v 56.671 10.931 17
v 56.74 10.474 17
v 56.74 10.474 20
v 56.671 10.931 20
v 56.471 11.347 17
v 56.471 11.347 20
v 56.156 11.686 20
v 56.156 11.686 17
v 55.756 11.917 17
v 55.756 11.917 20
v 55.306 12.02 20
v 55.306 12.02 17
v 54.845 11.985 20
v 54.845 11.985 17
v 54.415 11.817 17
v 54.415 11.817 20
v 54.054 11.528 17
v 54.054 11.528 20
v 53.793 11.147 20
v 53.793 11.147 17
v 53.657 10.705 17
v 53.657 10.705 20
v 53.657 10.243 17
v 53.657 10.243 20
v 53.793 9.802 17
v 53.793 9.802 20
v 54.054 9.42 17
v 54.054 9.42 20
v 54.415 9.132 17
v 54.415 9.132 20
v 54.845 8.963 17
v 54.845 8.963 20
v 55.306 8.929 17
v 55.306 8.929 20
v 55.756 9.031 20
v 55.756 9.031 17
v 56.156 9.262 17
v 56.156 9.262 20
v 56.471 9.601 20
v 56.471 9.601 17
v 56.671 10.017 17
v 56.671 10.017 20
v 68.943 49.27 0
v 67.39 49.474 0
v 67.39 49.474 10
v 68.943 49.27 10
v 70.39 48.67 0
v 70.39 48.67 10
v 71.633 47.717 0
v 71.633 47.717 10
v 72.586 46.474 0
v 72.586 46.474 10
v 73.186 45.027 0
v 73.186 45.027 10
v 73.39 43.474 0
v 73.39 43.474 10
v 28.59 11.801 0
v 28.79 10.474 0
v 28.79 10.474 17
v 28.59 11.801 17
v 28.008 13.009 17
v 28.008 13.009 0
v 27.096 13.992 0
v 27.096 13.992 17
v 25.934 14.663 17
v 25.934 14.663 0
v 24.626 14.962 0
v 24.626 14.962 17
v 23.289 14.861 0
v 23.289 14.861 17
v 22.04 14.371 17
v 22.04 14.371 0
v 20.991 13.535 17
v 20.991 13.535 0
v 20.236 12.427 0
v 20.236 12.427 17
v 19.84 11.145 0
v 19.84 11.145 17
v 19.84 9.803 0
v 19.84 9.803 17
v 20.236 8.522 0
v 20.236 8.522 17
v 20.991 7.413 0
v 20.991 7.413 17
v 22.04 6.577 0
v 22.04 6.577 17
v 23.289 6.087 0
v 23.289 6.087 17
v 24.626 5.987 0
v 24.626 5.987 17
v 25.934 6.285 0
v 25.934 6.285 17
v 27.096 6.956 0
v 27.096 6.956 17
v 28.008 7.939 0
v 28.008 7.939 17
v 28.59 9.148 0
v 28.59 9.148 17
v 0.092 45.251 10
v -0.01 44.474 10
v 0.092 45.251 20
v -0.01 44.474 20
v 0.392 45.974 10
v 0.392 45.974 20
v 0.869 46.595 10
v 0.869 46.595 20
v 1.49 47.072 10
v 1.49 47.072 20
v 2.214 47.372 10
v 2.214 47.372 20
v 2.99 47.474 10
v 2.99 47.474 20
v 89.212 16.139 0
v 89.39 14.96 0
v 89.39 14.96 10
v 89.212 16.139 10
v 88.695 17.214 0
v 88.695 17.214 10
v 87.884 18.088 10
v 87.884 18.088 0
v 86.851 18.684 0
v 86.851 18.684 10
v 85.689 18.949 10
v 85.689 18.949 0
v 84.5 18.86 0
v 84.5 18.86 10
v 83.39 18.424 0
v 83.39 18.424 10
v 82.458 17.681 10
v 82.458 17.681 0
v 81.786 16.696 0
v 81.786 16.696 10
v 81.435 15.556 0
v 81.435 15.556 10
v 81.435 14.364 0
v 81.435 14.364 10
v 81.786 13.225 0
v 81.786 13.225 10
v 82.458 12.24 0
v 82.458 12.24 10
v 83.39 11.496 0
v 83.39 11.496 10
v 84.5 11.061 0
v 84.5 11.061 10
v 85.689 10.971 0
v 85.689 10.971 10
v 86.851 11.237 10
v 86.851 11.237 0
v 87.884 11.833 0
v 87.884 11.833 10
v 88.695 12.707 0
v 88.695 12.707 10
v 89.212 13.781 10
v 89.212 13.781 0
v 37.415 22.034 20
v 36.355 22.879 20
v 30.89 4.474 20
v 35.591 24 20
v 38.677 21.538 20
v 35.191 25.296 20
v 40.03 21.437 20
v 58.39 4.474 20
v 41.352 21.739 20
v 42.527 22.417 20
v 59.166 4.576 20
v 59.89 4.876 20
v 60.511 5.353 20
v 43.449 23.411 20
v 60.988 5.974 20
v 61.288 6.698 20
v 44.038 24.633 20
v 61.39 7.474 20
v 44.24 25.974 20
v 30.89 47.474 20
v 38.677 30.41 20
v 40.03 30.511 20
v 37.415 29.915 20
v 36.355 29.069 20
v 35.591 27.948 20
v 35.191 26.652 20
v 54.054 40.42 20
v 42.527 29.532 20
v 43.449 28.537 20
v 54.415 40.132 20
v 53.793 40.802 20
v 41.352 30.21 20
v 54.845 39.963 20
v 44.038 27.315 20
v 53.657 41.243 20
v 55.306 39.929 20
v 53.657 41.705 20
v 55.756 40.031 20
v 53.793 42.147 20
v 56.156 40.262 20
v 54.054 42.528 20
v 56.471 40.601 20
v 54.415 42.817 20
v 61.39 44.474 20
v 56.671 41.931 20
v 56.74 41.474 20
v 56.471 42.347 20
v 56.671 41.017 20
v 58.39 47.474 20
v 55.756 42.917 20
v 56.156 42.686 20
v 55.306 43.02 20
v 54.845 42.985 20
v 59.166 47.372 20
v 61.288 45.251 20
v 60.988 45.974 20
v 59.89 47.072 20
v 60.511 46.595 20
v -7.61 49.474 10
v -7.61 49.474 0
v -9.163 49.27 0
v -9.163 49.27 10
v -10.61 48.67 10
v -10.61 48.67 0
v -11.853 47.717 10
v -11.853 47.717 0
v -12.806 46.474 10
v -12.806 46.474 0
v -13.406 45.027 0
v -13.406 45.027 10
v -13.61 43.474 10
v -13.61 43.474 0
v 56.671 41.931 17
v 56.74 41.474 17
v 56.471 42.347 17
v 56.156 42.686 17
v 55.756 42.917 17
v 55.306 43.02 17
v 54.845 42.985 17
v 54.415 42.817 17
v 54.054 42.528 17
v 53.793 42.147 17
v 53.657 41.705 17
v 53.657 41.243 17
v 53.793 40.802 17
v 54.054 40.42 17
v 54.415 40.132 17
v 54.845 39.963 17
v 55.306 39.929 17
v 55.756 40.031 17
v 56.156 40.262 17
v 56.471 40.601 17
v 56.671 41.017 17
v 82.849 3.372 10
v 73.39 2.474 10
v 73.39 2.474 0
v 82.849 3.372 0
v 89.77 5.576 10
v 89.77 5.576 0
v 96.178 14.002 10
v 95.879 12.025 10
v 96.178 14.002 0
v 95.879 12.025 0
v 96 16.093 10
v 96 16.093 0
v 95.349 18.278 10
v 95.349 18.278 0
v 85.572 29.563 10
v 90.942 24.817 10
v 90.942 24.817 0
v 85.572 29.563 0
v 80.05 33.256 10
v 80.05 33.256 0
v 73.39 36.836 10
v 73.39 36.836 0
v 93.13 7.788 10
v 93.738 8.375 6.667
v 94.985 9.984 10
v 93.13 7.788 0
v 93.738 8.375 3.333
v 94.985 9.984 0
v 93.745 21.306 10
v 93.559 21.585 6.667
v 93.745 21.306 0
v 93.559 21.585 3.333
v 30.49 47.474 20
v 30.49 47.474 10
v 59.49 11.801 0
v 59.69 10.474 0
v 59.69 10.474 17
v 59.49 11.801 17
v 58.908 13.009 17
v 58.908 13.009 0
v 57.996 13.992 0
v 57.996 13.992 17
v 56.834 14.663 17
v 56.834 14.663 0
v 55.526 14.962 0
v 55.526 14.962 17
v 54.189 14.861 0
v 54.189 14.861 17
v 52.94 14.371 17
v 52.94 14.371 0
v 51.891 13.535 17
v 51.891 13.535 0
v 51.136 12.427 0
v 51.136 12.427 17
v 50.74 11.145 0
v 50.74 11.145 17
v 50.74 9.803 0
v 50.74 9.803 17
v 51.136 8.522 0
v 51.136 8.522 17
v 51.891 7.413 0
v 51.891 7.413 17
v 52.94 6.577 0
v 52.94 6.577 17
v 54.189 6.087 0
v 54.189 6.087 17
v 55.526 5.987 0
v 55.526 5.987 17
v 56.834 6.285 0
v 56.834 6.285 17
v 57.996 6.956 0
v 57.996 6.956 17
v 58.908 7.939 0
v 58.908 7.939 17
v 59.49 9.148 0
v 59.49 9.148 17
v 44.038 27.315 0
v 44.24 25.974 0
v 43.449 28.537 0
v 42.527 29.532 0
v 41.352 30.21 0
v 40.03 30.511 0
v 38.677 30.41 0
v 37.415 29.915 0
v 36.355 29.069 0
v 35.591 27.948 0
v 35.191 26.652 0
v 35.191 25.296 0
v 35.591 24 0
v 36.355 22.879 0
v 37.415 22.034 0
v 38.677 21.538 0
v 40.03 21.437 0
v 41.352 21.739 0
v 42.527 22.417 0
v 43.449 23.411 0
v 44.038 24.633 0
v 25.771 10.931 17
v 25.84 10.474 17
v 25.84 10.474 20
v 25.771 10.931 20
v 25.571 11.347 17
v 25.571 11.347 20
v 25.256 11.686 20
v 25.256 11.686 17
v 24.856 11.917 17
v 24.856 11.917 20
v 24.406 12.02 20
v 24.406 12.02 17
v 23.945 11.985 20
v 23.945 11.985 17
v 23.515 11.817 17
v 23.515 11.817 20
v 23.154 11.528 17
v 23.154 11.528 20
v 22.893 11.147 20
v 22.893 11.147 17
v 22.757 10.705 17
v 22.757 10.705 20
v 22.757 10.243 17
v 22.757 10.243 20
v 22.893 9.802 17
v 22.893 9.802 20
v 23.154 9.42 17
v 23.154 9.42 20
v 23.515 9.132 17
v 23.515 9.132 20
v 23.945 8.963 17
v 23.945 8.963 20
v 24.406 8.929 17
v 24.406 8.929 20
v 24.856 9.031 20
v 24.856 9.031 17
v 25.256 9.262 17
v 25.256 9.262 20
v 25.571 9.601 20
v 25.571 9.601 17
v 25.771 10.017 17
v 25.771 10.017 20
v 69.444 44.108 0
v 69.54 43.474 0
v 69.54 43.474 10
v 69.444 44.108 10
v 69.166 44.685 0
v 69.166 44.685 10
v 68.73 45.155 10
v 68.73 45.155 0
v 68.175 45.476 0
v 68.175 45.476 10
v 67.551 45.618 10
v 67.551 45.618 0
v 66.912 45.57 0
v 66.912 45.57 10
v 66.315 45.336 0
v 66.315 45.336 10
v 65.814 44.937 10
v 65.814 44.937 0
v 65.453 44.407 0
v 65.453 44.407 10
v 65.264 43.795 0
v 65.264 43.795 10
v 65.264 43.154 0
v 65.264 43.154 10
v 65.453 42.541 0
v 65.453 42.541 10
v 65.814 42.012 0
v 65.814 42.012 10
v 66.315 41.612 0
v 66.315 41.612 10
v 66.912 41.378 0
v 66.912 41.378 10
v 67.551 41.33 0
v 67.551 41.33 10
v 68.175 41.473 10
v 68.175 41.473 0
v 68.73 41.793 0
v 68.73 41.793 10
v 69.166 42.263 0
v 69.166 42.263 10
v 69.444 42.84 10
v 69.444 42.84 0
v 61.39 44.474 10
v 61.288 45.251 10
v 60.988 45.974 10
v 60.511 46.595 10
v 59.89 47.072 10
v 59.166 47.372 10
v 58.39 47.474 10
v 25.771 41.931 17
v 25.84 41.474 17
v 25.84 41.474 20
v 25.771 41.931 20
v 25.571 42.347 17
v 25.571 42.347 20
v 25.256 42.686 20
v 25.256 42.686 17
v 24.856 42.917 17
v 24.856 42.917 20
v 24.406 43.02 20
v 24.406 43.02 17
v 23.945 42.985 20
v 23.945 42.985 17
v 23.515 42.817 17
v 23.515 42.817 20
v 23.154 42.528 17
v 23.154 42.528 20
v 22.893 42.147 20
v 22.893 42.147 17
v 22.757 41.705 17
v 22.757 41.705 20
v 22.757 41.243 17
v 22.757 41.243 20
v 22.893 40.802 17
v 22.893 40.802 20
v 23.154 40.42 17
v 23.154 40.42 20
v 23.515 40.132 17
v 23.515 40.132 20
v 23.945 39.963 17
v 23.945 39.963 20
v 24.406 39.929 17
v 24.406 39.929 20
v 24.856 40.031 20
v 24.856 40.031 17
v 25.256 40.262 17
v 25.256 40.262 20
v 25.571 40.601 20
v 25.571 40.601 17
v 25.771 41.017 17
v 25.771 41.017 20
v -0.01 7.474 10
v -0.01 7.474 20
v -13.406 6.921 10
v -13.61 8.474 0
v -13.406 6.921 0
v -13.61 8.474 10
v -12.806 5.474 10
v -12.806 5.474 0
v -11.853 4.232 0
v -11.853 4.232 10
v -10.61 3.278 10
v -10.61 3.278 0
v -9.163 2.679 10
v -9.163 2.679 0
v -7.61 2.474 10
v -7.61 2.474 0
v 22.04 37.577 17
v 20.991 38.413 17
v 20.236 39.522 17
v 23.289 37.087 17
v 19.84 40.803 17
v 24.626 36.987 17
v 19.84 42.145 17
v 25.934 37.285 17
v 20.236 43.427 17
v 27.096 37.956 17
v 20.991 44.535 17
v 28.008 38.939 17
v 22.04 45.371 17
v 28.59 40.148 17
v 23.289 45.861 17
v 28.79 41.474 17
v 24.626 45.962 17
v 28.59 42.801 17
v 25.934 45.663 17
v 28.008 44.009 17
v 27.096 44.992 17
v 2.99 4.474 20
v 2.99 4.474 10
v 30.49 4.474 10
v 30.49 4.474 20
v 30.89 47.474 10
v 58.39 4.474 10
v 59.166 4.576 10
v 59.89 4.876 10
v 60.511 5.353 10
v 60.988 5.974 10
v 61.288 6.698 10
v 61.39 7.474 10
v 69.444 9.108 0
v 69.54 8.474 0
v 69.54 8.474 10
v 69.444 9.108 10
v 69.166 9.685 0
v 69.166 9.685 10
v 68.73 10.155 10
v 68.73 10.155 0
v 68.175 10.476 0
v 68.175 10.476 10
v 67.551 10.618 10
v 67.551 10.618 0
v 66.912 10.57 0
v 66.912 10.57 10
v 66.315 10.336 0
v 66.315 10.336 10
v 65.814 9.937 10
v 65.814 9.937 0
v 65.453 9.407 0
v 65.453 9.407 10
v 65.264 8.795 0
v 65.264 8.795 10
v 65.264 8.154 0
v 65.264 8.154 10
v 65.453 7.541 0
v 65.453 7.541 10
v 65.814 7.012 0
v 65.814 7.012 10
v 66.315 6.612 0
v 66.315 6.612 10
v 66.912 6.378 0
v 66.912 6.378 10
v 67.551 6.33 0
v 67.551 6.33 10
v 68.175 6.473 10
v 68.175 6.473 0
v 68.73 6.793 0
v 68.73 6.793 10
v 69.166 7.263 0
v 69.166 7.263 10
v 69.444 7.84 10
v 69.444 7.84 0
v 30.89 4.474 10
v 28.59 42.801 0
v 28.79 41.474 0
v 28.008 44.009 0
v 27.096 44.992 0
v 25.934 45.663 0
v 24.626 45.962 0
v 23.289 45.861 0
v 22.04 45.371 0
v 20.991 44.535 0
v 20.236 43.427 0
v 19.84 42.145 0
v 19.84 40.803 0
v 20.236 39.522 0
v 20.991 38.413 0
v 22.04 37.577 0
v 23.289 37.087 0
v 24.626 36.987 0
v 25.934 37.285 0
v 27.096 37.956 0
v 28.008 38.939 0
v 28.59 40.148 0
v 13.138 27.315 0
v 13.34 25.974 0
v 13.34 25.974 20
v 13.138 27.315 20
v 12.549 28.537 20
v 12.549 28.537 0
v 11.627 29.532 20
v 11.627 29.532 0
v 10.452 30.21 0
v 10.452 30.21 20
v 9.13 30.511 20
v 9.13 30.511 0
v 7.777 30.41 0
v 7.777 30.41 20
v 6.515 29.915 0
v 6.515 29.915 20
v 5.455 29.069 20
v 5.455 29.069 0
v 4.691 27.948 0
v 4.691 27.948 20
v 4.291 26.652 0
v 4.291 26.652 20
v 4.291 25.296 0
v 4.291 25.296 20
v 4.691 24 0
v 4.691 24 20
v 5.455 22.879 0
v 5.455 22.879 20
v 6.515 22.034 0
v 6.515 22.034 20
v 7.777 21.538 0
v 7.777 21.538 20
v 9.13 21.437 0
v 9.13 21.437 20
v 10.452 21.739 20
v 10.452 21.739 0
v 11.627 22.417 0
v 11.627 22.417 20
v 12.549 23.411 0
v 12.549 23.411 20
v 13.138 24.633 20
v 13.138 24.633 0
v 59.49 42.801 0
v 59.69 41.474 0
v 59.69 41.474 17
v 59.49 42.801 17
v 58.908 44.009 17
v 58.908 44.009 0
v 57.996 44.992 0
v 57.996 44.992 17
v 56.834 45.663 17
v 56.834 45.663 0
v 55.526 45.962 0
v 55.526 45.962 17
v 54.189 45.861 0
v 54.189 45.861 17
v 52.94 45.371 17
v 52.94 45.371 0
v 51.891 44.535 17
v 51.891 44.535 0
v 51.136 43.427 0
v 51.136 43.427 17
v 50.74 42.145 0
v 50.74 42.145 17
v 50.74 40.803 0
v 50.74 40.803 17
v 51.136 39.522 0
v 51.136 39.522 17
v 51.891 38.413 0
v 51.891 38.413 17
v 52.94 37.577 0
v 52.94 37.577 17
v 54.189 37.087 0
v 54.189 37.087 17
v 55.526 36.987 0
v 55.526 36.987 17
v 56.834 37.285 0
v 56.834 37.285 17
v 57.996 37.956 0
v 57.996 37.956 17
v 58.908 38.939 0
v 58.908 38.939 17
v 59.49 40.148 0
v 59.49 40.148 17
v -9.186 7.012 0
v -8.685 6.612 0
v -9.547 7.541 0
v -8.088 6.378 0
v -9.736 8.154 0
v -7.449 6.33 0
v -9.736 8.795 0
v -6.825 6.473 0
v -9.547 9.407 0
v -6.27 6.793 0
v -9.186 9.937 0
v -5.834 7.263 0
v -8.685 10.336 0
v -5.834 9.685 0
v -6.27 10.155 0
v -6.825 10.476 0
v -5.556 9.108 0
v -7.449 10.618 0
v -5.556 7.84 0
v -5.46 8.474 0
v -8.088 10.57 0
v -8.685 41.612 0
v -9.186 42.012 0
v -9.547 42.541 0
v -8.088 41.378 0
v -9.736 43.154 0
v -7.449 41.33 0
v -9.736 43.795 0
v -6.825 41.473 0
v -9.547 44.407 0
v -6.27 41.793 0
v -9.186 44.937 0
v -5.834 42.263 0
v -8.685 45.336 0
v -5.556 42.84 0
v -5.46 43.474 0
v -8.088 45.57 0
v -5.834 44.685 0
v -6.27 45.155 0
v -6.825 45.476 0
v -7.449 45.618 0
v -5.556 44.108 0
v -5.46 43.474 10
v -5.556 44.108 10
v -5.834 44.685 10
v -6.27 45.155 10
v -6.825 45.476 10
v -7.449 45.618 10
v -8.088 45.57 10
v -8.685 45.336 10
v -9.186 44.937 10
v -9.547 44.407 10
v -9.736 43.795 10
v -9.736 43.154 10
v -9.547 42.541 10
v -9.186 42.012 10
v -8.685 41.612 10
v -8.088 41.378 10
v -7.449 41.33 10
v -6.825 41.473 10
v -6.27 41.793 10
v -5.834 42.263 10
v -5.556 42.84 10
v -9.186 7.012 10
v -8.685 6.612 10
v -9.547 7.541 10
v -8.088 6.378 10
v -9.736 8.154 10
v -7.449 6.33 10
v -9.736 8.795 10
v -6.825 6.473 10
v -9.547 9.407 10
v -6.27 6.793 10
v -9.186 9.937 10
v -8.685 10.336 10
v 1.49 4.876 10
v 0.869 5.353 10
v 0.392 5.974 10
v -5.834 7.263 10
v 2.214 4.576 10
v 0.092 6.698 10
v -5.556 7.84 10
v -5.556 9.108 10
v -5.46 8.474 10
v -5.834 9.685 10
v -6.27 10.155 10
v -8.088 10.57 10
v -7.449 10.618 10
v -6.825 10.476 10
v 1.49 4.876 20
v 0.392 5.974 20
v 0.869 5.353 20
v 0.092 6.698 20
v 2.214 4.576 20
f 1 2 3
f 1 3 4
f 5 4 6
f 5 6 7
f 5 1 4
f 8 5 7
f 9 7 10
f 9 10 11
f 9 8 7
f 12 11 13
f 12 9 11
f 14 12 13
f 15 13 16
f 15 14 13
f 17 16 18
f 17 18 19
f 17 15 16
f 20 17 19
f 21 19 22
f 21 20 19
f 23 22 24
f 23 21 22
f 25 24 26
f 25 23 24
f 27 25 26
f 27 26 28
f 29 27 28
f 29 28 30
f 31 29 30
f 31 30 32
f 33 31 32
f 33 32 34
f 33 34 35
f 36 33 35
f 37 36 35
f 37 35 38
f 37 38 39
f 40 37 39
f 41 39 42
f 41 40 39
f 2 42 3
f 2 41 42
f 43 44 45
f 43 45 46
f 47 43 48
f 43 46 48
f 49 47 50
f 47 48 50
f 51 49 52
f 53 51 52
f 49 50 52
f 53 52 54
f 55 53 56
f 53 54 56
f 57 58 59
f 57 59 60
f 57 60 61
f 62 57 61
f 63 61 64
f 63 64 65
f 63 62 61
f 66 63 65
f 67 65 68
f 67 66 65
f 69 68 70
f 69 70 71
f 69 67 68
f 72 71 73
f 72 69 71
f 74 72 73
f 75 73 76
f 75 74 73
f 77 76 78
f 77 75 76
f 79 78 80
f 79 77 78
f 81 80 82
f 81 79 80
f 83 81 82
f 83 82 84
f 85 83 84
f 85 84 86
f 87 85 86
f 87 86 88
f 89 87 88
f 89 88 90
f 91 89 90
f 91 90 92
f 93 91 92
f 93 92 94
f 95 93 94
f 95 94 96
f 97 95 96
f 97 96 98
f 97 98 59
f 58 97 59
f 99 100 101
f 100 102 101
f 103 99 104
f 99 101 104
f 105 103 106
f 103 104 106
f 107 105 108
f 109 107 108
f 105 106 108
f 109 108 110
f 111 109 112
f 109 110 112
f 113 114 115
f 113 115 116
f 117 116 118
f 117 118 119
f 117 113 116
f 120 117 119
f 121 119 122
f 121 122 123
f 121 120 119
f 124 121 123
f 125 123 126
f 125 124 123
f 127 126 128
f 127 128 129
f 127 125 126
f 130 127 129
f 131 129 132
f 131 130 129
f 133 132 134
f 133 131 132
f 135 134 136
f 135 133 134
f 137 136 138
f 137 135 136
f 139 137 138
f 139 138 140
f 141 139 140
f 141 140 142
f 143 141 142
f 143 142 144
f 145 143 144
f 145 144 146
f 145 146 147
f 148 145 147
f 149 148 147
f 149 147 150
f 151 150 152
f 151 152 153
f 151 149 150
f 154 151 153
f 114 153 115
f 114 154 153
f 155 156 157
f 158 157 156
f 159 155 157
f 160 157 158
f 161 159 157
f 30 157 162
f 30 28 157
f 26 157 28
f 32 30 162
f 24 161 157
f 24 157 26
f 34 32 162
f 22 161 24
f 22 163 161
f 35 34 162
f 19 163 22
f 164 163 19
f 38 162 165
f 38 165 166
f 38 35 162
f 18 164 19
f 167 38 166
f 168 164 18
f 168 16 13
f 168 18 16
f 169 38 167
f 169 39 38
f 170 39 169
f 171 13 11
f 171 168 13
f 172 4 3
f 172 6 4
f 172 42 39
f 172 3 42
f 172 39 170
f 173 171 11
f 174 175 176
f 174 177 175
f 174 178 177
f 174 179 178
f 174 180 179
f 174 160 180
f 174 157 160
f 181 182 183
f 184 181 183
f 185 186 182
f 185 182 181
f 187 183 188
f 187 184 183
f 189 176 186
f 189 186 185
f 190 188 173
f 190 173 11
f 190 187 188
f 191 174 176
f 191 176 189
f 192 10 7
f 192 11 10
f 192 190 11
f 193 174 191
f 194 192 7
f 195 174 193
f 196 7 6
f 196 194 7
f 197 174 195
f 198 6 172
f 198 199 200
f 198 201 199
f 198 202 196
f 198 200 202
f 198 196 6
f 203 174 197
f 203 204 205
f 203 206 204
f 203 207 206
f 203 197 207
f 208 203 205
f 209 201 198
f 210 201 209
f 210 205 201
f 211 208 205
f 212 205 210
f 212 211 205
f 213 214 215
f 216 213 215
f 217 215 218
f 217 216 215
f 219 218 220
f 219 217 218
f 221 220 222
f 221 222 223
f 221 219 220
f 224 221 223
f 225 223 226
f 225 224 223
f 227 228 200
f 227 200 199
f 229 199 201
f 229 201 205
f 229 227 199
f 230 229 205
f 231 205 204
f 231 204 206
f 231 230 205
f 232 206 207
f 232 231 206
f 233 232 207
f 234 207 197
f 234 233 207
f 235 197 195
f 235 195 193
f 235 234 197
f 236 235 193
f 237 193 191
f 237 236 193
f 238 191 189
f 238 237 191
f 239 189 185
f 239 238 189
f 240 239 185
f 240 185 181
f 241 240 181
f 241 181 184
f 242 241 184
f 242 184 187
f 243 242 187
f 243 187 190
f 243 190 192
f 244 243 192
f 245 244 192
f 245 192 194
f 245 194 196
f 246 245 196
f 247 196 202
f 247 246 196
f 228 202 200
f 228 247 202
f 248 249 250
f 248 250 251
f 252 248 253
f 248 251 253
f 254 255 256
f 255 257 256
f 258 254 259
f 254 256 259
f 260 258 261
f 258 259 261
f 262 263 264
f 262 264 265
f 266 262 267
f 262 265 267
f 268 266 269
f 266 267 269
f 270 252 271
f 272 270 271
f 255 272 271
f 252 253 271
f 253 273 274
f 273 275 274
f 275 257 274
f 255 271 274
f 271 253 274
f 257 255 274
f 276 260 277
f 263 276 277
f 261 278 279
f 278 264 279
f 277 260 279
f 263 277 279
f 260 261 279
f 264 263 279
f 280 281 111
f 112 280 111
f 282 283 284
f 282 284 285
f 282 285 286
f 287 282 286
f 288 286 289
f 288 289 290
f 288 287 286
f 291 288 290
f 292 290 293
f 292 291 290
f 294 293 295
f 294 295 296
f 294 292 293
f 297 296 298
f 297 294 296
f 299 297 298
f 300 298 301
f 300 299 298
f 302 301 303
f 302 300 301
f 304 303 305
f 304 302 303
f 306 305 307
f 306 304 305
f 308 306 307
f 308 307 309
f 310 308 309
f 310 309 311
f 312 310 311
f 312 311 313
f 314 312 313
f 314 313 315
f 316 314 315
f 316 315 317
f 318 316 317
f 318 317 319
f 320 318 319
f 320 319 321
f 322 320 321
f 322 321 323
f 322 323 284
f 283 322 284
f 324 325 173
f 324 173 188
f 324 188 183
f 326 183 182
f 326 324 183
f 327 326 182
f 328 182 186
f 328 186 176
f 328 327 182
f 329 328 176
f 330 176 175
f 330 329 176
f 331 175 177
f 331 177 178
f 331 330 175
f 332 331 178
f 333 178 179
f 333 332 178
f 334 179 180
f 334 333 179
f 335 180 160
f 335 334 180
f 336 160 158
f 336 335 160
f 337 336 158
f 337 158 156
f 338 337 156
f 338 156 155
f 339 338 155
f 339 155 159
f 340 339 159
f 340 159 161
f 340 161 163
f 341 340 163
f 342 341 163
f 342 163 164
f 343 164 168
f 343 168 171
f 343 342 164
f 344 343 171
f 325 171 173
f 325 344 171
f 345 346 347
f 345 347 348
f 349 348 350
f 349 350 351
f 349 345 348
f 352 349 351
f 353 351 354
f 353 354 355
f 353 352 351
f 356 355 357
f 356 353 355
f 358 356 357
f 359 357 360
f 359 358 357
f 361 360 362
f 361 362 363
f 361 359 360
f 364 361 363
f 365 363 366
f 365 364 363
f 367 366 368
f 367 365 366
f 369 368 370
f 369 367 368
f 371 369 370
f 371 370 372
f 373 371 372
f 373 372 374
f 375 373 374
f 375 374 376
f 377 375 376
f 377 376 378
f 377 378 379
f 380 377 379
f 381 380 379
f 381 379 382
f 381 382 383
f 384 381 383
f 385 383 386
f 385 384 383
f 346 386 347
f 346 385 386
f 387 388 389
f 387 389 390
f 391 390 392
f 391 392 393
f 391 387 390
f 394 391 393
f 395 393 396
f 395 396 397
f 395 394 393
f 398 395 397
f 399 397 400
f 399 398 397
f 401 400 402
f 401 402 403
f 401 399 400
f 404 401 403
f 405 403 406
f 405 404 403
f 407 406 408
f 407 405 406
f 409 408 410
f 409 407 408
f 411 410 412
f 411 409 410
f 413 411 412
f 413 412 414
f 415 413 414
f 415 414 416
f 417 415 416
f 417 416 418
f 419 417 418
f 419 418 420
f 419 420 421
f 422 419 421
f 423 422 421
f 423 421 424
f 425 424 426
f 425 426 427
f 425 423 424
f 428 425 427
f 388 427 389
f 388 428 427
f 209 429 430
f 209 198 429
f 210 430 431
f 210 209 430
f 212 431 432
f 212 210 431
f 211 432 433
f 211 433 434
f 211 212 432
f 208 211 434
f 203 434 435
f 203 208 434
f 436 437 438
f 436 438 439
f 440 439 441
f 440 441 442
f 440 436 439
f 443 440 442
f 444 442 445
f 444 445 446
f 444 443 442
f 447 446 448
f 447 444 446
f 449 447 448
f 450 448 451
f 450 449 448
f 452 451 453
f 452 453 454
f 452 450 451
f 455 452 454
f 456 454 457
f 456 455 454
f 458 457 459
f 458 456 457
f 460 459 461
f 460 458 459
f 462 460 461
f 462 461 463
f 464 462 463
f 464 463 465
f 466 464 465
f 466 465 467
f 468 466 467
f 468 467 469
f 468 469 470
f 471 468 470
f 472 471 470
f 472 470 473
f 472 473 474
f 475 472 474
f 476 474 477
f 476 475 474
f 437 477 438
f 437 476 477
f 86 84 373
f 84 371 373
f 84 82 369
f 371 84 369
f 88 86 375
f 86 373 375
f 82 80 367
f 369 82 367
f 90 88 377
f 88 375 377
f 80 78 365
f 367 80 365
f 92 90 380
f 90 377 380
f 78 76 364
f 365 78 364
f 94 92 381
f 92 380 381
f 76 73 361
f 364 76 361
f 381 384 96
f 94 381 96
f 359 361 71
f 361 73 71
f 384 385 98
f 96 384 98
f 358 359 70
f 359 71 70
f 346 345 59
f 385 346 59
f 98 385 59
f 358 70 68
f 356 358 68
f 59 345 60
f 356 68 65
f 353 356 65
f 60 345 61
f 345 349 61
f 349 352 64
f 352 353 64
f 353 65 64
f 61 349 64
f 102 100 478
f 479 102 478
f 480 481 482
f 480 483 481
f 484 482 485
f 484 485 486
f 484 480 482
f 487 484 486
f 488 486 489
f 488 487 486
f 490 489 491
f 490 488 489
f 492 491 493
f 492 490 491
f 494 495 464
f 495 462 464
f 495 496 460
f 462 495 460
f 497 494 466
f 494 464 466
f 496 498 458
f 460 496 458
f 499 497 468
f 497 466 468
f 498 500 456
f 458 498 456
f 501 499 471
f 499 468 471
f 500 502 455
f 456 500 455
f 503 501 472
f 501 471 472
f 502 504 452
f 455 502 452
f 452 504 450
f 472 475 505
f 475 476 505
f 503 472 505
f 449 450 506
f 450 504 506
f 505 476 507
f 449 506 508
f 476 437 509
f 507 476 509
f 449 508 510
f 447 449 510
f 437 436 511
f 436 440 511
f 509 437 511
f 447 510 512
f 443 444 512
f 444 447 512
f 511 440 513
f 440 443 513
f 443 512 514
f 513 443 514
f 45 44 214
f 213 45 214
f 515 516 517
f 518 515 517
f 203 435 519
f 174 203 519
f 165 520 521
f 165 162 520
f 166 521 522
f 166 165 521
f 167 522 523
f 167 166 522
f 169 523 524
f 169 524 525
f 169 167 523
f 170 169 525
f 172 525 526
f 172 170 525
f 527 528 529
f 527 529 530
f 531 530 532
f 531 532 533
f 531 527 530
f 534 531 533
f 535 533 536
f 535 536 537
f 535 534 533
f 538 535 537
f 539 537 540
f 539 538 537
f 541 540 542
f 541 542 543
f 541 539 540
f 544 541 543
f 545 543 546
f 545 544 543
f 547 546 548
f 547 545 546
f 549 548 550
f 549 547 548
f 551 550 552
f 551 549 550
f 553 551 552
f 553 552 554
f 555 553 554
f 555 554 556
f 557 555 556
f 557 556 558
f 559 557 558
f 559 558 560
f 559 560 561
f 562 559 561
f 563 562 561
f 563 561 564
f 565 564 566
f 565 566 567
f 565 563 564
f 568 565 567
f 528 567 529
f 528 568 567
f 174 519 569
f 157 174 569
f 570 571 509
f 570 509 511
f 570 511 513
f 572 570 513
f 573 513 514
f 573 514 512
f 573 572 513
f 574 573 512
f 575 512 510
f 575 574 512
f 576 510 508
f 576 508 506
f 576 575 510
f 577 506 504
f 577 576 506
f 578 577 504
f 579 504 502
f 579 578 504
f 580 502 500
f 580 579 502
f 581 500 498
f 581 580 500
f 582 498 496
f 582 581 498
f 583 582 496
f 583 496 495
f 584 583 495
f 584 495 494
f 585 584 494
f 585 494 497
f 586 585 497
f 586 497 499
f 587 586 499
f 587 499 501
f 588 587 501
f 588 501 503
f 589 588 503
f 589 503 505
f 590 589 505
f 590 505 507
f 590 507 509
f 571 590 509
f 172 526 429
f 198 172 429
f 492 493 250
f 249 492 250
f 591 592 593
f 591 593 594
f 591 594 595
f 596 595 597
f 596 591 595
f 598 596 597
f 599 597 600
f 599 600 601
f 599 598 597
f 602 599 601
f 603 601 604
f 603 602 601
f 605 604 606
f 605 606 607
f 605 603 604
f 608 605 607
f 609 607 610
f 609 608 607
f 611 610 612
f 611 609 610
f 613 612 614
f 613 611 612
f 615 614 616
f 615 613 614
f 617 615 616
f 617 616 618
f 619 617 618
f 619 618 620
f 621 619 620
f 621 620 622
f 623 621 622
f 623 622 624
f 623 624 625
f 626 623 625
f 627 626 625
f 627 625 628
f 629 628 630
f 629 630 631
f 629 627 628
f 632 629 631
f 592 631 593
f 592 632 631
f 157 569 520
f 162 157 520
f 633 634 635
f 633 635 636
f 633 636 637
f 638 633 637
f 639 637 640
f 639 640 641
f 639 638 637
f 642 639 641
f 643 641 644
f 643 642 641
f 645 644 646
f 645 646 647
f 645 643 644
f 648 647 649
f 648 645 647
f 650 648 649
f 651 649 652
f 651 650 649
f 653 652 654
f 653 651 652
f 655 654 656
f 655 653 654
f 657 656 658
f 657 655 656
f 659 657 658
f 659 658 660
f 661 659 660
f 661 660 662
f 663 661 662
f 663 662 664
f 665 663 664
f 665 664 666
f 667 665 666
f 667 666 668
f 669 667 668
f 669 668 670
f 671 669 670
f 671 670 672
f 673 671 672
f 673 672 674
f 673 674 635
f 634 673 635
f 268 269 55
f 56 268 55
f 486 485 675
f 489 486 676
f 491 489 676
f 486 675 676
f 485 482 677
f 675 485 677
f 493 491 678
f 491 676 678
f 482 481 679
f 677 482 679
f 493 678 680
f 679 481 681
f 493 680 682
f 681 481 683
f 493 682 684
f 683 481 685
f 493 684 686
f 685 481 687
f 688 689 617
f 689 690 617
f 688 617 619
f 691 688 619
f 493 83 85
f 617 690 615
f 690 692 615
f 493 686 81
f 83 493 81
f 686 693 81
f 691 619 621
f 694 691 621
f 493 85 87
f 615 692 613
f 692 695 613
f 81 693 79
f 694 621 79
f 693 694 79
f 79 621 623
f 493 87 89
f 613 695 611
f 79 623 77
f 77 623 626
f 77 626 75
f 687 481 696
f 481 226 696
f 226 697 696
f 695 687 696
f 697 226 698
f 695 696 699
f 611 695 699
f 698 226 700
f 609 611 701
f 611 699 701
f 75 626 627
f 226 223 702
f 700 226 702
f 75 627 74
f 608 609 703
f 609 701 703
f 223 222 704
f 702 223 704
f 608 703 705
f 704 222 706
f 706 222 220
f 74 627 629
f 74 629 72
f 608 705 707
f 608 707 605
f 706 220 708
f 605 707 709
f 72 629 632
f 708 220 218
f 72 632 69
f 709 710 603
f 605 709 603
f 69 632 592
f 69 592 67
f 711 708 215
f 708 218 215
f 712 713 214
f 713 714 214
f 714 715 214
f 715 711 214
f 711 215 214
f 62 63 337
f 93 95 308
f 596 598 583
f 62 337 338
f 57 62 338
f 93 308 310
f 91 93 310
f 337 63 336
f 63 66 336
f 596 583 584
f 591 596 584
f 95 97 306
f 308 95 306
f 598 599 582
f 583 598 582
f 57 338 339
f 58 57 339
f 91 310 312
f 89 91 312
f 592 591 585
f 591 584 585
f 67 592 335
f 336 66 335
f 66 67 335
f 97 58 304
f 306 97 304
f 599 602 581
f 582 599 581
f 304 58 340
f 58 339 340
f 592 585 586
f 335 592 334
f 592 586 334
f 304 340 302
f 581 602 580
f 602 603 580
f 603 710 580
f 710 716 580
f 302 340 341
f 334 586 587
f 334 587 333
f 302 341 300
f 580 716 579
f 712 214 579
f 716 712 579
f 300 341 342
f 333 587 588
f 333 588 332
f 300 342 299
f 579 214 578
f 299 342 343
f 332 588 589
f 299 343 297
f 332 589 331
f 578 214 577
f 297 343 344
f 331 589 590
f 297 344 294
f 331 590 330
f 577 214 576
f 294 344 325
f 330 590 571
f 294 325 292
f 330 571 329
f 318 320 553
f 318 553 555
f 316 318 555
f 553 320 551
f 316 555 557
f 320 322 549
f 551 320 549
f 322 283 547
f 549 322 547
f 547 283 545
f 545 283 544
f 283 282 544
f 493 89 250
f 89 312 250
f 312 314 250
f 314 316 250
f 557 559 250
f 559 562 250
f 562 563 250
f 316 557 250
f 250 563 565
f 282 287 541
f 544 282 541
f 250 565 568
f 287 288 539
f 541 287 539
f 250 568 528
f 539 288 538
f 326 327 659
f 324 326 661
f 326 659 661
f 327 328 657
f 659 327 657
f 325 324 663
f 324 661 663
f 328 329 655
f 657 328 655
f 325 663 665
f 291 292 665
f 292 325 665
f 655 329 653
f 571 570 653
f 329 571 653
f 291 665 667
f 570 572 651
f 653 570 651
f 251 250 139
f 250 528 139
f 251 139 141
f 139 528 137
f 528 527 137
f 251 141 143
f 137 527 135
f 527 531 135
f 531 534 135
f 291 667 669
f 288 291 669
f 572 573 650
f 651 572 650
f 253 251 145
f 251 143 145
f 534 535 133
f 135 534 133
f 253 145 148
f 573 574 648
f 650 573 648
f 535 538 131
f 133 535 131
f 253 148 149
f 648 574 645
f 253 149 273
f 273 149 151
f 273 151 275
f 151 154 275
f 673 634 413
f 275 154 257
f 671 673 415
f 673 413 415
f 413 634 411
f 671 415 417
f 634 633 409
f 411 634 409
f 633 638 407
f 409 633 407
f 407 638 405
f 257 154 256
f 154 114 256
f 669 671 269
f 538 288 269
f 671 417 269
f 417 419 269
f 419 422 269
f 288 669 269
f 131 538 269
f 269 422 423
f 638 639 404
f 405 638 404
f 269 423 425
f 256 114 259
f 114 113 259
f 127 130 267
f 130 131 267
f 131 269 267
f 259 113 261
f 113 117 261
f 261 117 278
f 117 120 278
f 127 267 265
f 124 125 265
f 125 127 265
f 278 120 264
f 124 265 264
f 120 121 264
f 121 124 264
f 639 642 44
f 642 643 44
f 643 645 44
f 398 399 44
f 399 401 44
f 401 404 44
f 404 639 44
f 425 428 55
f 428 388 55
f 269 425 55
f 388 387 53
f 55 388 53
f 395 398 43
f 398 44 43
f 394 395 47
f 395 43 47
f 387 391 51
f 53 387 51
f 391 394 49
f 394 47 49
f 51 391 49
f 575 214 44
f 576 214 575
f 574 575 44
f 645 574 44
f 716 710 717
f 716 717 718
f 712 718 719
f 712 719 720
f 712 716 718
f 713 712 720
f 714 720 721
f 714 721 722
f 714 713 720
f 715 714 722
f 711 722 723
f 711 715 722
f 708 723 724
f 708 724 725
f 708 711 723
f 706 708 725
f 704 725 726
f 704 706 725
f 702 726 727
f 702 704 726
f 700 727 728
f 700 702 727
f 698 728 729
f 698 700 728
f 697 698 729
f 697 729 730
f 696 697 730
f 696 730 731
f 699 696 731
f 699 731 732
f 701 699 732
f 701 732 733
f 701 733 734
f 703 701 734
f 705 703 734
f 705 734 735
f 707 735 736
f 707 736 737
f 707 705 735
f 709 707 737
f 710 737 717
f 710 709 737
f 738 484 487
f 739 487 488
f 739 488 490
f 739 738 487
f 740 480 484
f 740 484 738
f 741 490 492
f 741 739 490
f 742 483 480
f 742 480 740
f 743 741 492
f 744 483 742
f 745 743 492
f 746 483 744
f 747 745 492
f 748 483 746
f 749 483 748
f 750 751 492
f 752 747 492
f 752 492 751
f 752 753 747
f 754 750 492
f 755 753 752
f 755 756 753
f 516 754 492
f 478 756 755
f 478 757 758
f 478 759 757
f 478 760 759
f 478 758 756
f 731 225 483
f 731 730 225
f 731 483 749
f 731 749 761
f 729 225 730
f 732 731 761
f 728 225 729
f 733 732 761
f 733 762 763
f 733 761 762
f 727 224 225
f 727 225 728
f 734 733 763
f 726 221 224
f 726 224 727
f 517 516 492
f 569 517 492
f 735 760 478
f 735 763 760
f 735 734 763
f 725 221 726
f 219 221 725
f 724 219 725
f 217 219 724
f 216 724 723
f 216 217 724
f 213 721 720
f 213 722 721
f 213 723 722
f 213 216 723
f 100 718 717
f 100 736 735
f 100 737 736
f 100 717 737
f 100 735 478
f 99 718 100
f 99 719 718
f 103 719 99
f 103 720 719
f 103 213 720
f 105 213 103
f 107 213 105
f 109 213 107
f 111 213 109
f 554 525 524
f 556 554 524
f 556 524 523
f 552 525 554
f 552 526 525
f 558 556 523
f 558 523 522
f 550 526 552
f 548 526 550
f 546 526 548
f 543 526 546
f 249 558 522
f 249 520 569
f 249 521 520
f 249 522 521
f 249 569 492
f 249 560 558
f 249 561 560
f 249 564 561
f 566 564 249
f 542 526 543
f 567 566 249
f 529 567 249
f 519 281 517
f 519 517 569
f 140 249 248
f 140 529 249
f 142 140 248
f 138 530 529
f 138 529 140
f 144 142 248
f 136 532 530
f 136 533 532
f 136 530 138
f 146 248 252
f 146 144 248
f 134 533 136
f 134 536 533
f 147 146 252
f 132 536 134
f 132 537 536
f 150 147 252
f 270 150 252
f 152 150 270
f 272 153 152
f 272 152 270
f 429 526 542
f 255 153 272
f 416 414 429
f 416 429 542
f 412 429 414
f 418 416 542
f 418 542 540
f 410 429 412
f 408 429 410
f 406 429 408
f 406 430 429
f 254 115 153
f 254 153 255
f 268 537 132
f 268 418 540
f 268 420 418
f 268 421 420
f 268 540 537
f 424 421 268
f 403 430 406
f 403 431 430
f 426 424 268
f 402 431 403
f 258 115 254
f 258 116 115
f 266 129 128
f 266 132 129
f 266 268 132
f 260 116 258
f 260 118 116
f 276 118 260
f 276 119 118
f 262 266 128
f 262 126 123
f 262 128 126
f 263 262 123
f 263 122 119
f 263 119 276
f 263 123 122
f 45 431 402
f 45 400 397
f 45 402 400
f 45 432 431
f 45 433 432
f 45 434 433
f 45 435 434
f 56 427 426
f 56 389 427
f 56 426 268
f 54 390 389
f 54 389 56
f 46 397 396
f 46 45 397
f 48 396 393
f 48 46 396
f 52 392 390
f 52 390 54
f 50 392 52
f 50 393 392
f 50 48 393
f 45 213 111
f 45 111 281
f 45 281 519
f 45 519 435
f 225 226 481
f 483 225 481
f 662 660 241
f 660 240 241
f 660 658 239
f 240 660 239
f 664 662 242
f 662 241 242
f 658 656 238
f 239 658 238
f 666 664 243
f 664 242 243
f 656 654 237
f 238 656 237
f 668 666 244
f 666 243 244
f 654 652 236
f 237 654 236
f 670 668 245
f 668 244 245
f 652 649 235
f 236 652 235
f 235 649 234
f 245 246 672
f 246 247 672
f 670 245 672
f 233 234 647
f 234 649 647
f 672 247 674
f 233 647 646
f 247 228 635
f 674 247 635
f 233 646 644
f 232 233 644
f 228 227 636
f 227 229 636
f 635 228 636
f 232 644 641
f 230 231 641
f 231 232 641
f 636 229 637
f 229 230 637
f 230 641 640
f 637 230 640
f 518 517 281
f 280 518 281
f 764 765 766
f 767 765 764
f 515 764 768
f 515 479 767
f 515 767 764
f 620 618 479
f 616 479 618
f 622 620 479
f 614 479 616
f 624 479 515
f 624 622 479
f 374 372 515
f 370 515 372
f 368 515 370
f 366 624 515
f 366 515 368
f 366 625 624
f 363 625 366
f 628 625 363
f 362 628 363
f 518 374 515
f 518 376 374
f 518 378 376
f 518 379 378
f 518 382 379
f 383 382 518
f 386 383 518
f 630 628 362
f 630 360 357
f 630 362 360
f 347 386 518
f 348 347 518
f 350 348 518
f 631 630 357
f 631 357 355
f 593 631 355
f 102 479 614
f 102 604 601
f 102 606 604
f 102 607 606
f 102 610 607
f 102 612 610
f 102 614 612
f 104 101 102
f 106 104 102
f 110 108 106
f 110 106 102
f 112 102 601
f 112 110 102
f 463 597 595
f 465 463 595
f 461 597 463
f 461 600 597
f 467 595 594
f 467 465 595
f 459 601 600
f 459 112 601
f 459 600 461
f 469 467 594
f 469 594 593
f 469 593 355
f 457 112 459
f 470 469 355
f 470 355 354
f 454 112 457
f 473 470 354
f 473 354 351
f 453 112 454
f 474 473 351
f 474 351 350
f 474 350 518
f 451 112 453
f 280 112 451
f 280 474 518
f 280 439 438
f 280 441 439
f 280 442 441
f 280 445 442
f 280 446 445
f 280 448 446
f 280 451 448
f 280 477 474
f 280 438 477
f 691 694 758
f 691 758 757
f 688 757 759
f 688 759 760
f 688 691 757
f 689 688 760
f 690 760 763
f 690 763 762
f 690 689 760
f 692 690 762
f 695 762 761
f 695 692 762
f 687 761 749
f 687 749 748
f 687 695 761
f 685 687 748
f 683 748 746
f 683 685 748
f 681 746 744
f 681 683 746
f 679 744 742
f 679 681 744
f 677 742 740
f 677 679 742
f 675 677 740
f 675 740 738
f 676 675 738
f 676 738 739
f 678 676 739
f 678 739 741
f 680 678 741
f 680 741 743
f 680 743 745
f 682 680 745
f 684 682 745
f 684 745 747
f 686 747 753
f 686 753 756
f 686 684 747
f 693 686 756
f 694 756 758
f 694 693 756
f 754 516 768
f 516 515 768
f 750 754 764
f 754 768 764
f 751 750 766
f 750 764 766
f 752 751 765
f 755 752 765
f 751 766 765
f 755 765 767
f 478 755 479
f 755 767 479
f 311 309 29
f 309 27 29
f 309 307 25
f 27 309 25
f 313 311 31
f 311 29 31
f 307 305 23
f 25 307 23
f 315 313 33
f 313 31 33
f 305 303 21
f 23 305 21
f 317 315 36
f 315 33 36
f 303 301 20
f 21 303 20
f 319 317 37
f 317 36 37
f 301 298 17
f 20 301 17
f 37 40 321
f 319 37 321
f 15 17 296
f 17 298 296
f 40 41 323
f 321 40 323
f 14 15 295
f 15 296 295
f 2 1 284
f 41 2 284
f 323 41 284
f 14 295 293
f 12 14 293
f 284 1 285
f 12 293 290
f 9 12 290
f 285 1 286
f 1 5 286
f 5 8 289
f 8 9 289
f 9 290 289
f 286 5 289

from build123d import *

# Parameters (mm, degrees)
F0_R     = 2.15
F0_R_2   = 4
F1_DEPTH = 10
F0_R_3   = 4.5
F0_R_4   = 4.55
F2_DEPTH = 20
F3_START = 17
F0_R_5   = 1.55
F3_DEPTH = 3
F4_R     = 6
F5_R     = 3


with BuildPart() as f1:
    # F0 (on Top) → F1 (new body)
    with BuildSketch(Plane.XY):
        Polygon((73.3899642625, 49.4741697694), (-13.6100357375, 49.4741697694), (-13.6100357375, 2.4741697694), (73.3899642625, 2.4741697694), (73.3899642625, 36.8359796703), align=None)
        with Locations((-7.6100357375, 8.4741697694)):
            Circle(F0_R, mode=Mode.SUBTRACT)
        Polygon((-0.0100357375, 4.4741697694), (-0.0100357375, 47.4741697694), (30.4899642625, 47.4741697694), (30.4899642625, 4.4741697694), (20.6151821792, 4.4741697694), (8.9151821792, 4.4741697694), align=None, mode=Mode.SUBTRACT)
        with Locations((67.3899642625, 8.4741697694)):
            Circle(F0_R, mode=Mode.SUBTRACT)
        with Locations((-7.6100357375, 43.4741697694)):
            Circle(F0_R, mode=Mode.SUBTRACT)
        Polygon((30.8899642625, 4.4741697694), (30.8899642625, 47.4741697694), (61.3899642625, 47.4741697694), (61.3899642625, 4.4741697694), (53.5151823588, 4.4741697694), (41.8151823588, 4.4741697694), align=None, mode=Mode.SUBTRACT)
        with Locations((67.3899642625, 43.4741697694)):
            Circle(F0_R, mode=Mode.SUBTRACT)
        with BuildLine():
            add(Edge.make_bspline(
                [(73.3899642625, 2.4741697694), (104.1805148125, 2.9646980111), (103.3740565181, 22.3197154701), (73.3899642625, 36.8359796703)],
                knots=[0, 0, 0, 0, 34.3618099009, 34.3618099009, 34.3618099009, 34.3618099009], degree=3))
            Line((73.3899642625, 36.8359796703), (73.3899642625, 2.4741697694))
        make_face()
        with Locations((85.3899642625, 14.960267581)):
            Circle(F0_R_2, mode=Mode.SUBTRACT)
    extrude(amount=F1_DEPTH)

    # F0 (on Top) → F2 (join)
    with BuildSketch(Plane.XY):
        Polygon((30.4899642625, 47.4741697694), (-0.0100357375, 47.4741697694), (-0.0100357375, 4.4741697694), (8.9151821792, 4.4741697694), (20.6151821792, 4.4741697694), (30.4899642625, 4.4741697694), align=None)
        with Locations((24.2899642625, 10.4741697694)):
            Circle(F0_R_3, mode=Mode.SUBTRACT)
        with Locations((8.7899642625, 25.9741697694)):
            Circle(F0_R_4, mode=Mode.SUBTRACT)
        with Locations((24.2899642625, 41.4741697694)):
            Circle(F0_R_3, mode=Mode.SUBTRACT)
        Polygon((61.3899642625, 47.4741697694), (30.8899642625, 47.4741697694), (30.8899642625, 4.4741697694), (41.8151823588, 4.4741697694), (53.5151823588, 4.4741697694), (61.3899642625, 4.4741697694), align=None)
        with Locations((39.6899642625, 25.9741697694)):
            Circle(F0_R_4, mode=Mode.SUBTRACT)
        with Locations((55.1899642625, 10.4741697694)):
            Circle(F0_R_3, mode=Mode.SUBTRACT)
        with Locations((55.1899642625, 41.4741697694)):
            Circle(F0_R_3, mode=Mode.SUBTRACT)
    extrude(amount=F2_DEPTH)

    # F0 (on Top) → F3 (join)
    with BuildSketch(Plane.XY.offset(F3_START)):
        with Locations((24.2899642625, 41.4741697694)):
            Circle(F0_R_3)
        with Locations((24.2899642625, 41.4741697694)):
            Circle(F0_R_5, mode=Mode.SUBTRACT)
        with Locations((55.1899642625, 41.4741697694)):
            Circle(F0_R_3)
        with Locations((55.1899642625, 41.4741697694)):
            Circle(F0_R_5, mode=Mode.SUBTRACT)
        with Locations((55.1899642625, 10.4741697694)):
            Circle(F0_R_3)
        with Locations((55.1899642625, 10.4741697694)):
            Circle(F0_R_5, mode=Mode.SUBTRACT)
        with Locations((24.2899642625, 10.4741697694)):
            Circle(F0_R_3)
        with Locations((24.2899642625, 10.4741697694)):
            Circle(F0_R_5, mode=Mode.SUBTRACT)
    extrude(amount=F3_DEPTH)

    # F4
    f4_edges = [f1.edges().sort_by_distance(p)[0] for p in [
        (73.389964, 2.47417, 5),
        (73.389964, 49.47417, 5),
        (-13.610036, 49.47417, 5),
        (-13.610036, 2.47417, 5),
    ]]
    fillet(f4_edges, radius=F4_R)

    # F5
    f5_edges = [f1.edges().sort_by_distance(p)[0] for p in [
        (-0.010036, 4.47417, 15),
        (61.389964, 4.47417, 15),
        (61.389964, 47.47417, 15),
        (-0.010036, 47.47417, 15),
    ]]
    fillet(f5_edges, radius=F5_R)


solid = f1.part
